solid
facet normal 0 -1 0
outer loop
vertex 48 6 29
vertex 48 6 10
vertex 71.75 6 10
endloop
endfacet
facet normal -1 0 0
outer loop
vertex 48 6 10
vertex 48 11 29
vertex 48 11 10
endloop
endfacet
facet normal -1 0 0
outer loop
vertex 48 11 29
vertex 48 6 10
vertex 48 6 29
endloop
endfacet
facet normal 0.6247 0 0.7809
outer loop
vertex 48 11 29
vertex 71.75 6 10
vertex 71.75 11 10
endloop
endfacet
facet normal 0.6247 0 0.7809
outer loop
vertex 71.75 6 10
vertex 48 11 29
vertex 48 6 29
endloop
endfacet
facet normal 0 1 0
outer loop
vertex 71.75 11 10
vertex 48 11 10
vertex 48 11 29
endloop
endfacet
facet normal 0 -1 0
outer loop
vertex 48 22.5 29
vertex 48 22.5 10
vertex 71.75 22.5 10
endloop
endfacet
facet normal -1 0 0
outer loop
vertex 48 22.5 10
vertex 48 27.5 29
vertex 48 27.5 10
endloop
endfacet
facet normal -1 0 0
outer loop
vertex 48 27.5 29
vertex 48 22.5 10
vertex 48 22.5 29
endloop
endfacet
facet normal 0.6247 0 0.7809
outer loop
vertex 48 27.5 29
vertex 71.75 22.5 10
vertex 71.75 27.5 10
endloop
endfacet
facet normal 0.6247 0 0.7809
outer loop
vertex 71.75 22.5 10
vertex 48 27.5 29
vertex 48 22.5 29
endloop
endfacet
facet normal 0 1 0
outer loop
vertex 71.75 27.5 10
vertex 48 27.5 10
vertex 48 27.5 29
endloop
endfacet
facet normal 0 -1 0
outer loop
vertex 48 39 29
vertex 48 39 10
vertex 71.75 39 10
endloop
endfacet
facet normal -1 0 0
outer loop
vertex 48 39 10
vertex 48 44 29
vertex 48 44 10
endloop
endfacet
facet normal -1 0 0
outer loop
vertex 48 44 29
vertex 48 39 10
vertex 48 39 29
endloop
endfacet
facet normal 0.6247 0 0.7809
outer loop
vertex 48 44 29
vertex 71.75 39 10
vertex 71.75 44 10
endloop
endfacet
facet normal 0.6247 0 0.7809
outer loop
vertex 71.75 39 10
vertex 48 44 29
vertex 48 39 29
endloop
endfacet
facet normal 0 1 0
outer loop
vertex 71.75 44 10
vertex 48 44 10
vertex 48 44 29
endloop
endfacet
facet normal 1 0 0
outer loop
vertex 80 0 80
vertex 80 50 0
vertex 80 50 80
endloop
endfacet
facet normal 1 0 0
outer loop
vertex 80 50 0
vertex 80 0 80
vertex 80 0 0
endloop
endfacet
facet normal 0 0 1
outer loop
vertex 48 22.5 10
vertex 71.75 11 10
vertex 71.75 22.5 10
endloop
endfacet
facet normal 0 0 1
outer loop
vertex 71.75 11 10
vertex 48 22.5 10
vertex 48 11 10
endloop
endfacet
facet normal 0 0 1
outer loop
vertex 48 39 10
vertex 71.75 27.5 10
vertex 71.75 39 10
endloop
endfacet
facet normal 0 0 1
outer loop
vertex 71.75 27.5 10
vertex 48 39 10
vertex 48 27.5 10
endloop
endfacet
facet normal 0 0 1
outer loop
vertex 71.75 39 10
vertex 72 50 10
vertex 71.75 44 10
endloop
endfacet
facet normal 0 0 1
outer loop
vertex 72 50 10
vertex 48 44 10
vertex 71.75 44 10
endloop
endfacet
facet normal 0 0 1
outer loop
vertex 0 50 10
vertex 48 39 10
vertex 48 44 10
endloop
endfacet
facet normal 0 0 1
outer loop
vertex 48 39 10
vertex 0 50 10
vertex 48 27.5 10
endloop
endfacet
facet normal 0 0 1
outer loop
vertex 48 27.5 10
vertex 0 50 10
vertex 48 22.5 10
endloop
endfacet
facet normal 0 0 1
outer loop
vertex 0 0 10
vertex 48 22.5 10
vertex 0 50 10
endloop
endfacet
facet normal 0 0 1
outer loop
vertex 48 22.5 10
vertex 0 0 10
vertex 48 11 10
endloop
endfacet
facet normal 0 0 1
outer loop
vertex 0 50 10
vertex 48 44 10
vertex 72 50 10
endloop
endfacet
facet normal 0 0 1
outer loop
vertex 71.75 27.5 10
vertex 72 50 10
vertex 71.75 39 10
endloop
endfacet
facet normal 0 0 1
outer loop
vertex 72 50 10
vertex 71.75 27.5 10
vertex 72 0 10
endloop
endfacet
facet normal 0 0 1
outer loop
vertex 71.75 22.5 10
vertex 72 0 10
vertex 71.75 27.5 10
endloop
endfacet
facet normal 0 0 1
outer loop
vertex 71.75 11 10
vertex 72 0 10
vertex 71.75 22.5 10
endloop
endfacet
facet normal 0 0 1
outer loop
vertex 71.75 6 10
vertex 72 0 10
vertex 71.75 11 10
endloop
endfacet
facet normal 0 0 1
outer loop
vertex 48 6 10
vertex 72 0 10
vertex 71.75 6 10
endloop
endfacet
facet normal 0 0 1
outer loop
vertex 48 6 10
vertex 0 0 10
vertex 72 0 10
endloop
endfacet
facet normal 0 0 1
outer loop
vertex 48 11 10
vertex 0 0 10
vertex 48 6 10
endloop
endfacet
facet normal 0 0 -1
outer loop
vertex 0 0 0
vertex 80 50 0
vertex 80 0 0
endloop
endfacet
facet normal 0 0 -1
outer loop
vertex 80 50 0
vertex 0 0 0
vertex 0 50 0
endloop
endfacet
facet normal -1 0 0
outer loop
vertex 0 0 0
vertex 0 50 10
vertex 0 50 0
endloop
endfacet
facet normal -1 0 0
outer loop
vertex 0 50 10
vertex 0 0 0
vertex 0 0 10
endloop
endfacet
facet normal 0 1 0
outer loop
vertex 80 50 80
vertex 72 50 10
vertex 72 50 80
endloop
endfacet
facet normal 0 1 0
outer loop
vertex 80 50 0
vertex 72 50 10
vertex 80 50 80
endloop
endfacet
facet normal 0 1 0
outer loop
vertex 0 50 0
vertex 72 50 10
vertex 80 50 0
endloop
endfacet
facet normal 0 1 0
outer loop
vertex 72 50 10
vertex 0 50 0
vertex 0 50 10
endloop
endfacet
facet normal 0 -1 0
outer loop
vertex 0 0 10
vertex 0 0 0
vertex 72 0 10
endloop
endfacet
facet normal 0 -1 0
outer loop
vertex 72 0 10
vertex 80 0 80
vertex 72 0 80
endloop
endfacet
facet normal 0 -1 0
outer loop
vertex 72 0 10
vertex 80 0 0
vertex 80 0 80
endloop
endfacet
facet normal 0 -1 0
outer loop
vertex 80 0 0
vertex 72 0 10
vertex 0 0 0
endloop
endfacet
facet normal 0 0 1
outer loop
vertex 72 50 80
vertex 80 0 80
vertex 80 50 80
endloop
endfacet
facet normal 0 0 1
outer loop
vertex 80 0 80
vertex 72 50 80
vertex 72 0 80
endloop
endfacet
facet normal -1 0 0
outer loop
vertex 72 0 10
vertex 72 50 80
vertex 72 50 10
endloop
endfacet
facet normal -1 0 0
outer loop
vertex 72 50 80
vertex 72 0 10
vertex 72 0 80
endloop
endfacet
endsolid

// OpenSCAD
$fn = 32;

// ----------------------------------------------------------------------
// Rib bracket: 3-gusset L bracket
// ----------------------------------------------------------------------

// --- parameters (mm) ---
base_l = 80;              // foot length, X
base_w = 50;              // foot width, Y
base_t = 10;              // foot thickness
plate_t = 8;              // upright plate thickness
plate_h = 80;             // overall height
gus_l = 24;               // gusset leg along the foot
gus_h = 20;               // gusset height
gus_t = 5;                // gusset thickness
gus_edge = 6;             // gusset margin from the foot edge
n_gus = 3;                // gusset count
fit_tol = 0.05;           // tolerance for press fits, mm
free_tol = 0.3;           // tolerance for clearance fits, mm

gus_pitch = (base_w - 2 * gus_edge - gus_t) / (n_gus - 1);  // gusset pitch

union() {
  cube([base_l, base_w, base_t]);
  translate([base_l - plate_t, 0, base_t - 1])
    cube([plate_t, base_w, plate_h - base_t + 1]);
  for (i = [0 : n_gus - 1])
    translate([base_l - plate_t - gus_l, gus_edge + i * gus_pitch, base_t - 1])
      rotate([-90, 0, 0])
        linear_extrude(height = gus_t)
          polygon(points = [[0, 0], [gus_l + 1, 0], [0, -gus_h]]);
}
